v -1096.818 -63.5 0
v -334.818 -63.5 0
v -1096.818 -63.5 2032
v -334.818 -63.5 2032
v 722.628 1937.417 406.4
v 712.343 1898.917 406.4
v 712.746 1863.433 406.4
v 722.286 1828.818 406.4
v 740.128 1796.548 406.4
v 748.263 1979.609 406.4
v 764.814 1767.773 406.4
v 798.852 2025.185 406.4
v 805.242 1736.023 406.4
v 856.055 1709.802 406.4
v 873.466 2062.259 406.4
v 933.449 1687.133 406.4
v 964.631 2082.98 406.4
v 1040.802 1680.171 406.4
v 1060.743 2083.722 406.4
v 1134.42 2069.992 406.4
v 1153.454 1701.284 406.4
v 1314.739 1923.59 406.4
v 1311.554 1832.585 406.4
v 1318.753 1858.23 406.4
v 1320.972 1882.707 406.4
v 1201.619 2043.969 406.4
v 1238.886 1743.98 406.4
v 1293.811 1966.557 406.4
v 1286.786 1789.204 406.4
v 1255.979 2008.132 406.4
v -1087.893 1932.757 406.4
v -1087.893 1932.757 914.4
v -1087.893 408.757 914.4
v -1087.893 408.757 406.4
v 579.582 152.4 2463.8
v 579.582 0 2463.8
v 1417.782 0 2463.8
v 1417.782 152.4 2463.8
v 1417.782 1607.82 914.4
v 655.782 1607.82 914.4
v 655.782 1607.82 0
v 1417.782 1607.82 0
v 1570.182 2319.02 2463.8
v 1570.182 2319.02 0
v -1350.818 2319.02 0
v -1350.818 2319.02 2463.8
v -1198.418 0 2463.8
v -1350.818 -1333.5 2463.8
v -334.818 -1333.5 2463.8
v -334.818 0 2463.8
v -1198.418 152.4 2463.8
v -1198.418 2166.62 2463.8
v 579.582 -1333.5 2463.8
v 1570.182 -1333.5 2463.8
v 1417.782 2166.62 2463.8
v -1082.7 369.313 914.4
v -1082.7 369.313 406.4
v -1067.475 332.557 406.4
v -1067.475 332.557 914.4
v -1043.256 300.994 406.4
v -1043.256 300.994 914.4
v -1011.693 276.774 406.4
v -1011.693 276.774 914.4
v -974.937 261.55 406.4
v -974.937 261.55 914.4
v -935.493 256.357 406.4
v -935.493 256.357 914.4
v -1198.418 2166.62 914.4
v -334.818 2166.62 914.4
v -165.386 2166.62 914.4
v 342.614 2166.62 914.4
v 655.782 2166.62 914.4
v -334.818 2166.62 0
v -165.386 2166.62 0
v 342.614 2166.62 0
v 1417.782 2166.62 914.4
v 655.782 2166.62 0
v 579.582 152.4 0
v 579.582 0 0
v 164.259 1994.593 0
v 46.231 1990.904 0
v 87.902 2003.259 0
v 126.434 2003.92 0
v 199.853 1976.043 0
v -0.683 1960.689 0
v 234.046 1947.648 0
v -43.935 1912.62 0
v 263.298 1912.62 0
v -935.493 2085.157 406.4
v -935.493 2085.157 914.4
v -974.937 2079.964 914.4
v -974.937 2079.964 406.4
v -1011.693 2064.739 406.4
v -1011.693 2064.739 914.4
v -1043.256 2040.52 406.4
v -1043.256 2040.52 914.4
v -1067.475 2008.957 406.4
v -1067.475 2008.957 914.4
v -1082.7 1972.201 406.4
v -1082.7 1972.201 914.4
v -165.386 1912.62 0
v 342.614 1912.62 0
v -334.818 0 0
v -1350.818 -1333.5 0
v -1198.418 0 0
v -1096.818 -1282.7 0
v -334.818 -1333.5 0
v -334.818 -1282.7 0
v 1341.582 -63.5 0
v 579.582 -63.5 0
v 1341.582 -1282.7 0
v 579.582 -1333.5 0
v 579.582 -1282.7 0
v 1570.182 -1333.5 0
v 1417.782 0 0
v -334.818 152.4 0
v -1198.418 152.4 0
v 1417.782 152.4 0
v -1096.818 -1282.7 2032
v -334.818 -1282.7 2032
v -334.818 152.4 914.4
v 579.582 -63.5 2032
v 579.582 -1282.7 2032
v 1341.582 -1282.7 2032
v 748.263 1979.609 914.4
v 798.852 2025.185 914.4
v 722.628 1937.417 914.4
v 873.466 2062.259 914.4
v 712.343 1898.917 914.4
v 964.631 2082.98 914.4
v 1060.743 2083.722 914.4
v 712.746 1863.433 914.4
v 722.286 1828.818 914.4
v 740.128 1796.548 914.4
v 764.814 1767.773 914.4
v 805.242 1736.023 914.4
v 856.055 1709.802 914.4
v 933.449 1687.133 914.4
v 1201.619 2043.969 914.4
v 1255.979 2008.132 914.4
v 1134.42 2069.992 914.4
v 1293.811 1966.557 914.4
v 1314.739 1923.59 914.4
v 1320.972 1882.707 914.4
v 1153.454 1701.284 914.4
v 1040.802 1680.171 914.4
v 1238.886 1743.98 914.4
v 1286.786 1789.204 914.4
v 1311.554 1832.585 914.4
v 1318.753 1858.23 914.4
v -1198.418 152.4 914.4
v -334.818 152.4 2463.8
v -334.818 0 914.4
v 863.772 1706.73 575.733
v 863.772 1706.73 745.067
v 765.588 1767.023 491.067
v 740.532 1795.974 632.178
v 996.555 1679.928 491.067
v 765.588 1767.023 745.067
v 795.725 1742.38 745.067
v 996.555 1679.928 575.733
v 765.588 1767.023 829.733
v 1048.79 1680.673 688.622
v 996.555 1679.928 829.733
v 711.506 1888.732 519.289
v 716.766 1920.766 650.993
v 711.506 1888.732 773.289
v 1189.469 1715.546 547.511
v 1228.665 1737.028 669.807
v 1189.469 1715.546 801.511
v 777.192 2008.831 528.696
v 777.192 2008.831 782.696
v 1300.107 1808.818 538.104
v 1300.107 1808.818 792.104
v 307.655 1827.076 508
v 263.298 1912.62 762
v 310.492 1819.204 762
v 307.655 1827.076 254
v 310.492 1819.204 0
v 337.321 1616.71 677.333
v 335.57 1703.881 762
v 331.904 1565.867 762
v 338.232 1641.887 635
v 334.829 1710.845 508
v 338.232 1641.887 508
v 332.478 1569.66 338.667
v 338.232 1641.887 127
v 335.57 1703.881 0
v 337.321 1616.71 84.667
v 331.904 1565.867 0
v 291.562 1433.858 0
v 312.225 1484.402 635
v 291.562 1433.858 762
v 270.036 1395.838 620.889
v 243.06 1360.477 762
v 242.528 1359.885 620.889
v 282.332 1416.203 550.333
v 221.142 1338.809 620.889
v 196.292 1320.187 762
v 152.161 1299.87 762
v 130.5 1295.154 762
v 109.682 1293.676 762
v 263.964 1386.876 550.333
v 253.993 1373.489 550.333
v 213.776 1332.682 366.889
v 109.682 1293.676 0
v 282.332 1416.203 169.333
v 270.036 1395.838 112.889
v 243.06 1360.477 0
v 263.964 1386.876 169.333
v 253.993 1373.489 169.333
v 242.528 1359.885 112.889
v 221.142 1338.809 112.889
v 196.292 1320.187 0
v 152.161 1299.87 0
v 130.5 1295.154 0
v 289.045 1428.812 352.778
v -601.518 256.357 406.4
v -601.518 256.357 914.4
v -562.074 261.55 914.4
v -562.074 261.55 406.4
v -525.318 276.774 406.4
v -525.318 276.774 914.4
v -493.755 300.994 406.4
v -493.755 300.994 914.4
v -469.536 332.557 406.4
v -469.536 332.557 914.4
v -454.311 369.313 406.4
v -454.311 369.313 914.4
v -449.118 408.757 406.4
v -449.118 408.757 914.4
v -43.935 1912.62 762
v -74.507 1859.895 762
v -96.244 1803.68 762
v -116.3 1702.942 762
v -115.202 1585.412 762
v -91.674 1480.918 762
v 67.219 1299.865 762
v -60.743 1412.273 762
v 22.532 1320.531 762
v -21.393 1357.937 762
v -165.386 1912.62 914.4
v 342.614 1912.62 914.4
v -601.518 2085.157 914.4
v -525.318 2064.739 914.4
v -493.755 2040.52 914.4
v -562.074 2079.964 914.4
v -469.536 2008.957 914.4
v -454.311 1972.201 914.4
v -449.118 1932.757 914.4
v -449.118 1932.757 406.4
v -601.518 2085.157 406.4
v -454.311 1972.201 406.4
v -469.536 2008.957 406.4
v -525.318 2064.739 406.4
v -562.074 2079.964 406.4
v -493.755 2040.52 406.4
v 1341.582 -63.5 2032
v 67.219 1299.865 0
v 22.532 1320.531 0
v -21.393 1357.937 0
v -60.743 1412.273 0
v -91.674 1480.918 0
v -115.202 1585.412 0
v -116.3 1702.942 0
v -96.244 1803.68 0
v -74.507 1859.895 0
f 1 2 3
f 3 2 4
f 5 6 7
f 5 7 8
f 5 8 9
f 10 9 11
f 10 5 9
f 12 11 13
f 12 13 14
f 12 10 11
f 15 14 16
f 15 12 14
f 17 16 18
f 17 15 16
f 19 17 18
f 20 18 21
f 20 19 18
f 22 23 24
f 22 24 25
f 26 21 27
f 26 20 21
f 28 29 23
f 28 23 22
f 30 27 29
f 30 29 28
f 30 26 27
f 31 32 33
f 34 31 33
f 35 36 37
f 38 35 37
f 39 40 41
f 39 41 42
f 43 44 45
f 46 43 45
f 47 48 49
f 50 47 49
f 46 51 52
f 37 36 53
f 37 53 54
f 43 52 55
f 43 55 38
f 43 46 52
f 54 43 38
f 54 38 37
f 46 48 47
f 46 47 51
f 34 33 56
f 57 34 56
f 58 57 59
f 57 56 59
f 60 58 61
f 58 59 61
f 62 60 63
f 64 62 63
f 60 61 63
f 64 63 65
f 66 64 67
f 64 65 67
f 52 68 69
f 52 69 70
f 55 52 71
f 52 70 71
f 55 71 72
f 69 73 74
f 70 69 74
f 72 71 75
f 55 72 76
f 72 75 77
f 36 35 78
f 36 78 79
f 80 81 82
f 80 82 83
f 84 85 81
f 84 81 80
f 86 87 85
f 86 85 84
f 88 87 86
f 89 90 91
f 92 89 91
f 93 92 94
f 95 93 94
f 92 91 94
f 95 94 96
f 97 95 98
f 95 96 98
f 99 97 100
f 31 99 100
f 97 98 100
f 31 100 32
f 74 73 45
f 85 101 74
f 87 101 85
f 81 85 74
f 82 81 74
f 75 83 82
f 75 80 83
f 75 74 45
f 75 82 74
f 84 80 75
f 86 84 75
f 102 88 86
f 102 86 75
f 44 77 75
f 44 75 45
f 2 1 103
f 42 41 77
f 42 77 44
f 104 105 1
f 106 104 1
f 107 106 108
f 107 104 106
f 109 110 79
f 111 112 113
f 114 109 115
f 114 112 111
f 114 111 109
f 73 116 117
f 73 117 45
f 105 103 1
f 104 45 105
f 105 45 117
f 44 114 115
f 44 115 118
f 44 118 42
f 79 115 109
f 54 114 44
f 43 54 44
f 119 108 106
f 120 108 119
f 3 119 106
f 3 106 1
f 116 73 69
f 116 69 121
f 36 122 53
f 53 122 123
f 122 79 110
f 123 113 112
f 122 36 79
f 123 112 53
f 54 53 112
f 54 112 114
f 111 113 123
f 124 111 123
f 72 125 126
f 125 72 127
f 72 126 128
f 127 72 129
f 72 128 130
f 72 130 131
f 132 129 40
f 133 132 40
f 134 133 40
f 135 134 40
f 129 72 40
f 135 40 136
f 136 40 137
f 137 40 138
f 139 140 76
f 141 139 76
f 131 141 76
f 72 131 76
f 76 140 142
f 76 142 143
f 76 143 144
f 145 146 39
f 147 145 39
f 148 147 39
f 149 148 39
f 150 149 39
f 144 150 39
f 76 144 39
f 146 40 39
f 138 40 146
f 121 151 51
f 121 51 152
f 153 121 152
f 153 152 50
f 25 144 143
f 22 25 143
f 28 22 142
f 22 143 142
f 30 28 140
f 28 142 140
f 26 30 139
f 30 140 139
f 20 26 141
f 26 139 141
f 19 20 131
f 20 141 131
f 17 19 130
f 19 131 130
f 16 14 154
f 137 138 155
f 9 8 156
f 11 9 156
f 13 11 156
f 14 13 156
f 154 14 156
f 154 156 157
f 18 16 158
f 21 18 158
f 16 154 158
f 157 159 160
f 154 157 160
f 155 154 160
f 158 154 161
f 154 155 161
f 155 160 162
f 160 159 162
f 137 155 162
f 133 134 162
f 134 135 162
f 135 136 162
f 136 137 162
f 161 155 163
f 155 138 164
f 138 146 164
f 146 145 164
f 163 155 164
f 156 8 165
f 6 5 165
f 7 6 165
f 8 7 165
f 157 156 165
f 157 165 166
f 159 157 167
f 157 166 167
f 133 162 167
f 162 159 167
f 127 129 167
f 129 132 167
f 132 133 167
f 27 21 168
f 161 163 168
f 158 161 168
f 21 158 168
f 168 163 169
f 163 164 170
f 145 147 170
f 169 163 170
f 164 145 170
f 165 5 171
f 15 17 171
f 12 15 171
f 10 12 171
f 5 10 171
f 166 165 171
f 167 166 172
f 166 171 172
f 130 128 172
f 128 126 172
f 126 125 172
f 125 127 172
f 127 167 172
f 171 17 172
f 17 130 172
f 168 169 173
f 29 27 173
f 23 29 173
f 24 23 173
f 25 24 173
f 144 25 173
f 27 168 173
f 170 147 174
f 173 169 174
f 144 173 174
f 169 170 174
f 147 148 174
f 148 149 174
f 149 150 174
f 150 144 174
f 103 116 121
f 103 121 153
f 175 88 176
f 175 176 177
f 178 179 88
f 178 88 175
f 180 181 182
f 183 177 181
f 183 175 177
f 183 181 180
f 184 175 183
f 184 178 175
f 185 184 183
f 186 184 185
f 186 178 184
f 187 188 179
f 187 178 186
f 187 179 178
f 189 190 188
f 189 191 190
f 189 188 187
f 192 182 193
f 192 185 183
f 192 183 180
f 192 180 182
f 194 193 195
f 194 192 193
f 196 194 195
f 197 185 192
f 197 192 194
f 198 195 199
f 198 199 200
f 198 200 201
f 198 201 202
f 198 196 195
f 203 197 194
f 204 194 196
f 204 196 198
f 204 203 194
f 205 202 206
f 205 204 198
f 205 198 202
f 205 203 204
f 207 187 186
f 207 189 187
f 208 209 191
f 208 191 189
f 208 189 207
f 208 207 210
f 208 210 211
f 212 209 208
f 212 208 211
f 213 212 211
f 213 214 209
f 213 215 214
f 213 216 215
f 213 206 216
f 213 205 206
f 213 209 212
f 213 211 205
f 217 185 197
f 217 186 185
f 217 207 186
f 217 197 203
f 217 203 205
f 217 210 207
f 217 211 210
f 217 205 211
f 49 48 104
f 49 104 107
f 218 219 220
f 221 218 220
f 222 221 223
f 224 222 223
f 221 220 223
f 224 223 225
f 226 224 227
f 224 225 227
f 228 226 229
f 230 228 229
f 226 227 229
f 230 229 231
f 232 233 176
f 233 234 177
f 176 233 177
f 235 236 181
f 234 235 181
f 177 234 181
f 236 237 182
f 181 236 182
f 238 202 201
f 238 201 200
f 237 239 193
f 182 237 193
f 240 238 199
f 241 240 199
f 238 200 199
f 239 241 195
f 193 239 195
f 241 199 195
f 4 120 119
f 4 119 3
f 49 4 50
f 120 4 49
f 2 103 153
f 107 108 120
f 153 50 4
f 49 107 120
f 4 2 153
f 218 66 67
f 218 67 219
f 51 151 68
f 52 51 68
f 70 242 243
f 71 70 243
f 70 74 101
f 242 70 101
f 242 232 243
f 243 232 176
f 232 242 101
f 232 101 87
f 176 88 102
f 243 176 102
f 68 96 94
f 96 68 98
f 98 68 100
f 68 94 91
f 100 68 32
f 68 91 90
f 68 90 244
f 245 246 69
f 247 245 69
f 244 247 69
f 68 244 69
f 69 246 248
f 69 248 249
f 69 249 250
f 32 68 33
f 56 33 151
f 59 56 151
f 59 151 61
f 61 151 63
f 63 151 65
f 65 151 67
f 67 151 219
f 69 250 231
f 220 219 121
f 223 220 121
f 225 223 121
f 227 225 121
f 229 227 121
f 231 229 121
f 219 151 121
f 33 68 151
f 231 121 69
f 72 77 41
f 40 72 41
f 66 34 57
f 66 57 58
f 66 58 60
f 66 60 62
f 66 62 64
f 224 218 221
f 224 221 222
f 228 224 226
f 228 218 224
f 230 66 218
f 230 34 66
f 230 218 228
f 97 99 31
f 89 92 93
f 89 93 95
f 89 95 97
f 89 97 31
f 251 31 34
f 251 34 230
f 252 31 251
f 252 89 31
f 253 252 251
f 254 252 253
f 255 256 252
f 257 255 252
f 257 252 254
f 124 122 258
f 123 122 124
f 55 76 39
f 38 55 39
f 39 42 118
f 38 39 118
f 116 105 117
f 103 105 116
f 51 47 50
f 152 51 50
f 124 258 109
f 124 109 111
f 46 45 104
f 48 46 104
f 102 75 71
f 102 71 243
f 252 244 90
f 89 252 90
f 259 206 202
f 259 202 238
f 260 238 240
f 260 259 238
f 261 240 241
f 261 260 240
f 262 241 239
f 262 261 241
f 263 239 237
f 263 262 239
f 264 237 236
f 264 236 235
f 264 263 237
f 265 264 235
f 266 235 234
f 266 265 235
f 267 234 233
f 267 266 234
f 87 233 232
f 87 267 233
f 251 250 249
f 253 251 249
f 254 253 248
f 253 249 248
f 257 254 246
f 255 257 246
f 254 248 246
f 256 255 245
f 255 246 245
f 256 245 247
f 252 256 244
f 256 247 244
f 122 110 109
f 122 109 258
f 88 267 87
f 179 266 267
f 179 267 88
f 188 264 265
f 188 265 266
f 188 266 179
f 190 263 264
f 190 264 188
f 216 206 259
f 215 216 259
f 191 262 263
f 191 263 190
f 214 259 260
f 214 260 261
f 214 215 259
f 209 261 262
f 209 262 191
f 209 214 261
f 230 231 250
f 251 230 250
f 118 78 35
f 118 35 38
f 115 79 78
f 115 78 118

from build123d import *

# Parameters (mm, degrees)
F1_DEPTH  = 2463.8
F2_W      = 1219.2
F2_H      = 2032
F3_DEPTH  = 762
F4_W      = 1219.2
F4_H      = 2032
F5_DEPTH  = 762
F6_W      = 762
F6_H      = 558.8
F6_W_2    = 863.6
F6_H_2    = 2166.62
F6_W_3    = 508
F6_H_3    = 254
F7_DEPTH  = 914.4
F9_DEPTH  = 762
F11_DEPTH = 508
F12_W     = 838.2
F12_H     = 152.4
F12_W_2   = 863.6
F13_DEPTH = 2463.8


with BuildPart() as f1:
    # F0 (on Top) → F1 (new body)
    with BuildSketch(Plane.XY):
        Polygon((-334.8183358609, 0), (-1198.4183358609, 0), (-1198.4183358609, 2166.62), (1417.7816641391, 2166.62), (1417.7816641391, 0), (579.5816641391, 0), (579.5816641391, -1333.5), (1570.1816641391, -1333.5), (1570.1816641391, 0), (1570.1816641391, 2319.02), (-1350.8183358609, 2319.02), (-1350.8183358609, 0), (-1350.8183358609, -1333.5), (-334.8183358609, -1333.5), align=None)
    extrude(amount=F1_DEPTH)

    # F2 (on face) → F3 (cut)
    with BuildSketch(Plane.YZ.offset(-334.8183358609)):
        with Locations((-673.1, 1016)):
            Rectangle(F2_W, F2_H)
    extrude(amount=-F3_DEPTH, mode=Mode.SUBTRACT)

    # F4 (on face) → F5 (cut)
    with BuildSketch(Plane(origin=(579.5816641391, 0, 0), x_dir=(0, -1, 0), z_dir=(-1, 0, 0))):
        with Locations((673.1, 1016)):
            Rectangle(F4_W, F4_H)
    extrude(amount=-F5_DEPTH, mode=Mode.SUBTRACT)

    # F6 (on face) → F7 (join)
    with BuildSketch(Plane(origin=(0, 0, 0), x_dir=(1, 0, 0), z_dir=(0, 0, -1))):
        with Locations((1036.7816641391, -1887.22)):
            Rectangle(F6_W, F6_H)
        with Locations((-766.6183358609, -1083.31)):
            Rectangle(F6_W_2, F6_H_2)
        with Locations((88.6141725779, -2039.62)):
            Rectangle(F6_W_3, F6_H_3)
    extrude(amount=-F7_DEPTH)

    # F8 (on face) → F9 (join)
    with BuildSketch(Plane(origin=(0, 0, 0), x_dir=(1, 0, 0), z_dir=(0, 0, -1))):
        with BuildLine():
            add(Edge.make_bspline(
                [(109.6816062927, -1293.6762565613), (-286.2652083175, -1293.6762565613), (-88.2918010124, -1827.0762565613), (109.6816062927, -2360.4762565613), (307.6550135978, -1827.0762565613), (505.628420903, -1293.6762565613), (109.6816062927, -1293.6762565613)],
                knots=[0, 0, 0, 2.0943951024, 2.0943951024, 4.1887902048, 4.1887902048, 6.2831853072, 6.2831853072, 6.2831853072], degree=2, weights=[1, 0.5, 1, 0.5, 1, 0.5, 1]))
        make_face()
    extrude(amount=-F9_DEPTH)

    # F10 (on face) → F11 (cut)
    with BuildSketch(Plane.XY.offset(914.4)):
        with BuildLine():
            Line((-601.5183358609, 2085.1567547083), (-935.4930091858, 2085.1567547083))
            ThreePointArc((-935.4930091858, 2085.1567547083), (-1043.2560826386, 2040.5198281611), (-1087.8930091858, 1932.7567547083))
            Line((-1087.8930091858, 1932.7567547083), (-1087.8930091858, 408.7567547083))
            ThreePointArc((-1087.8930091858, 408.7567547083), (-1043.2560826386, 300.9936812555), (-935.4930091858, 256.3567547083))
            Line((-935.4930091858, 256.3567547083), (-601.5183358609, 256.3567547083))
            ThreePointArc((-601.5183358609, 256.3567547083), (-493.755262408, 300.9936812555), (-449.1183358609, 408.7567547083))
            Line((-449.1183358609, 408.7567547083), (-449.1183358609, 1932.7567547083))
            ThreePointArc((-449.1183358609, 1932.7567547083), (-493.755262408, 2040.5198281611), (-601.5183358609, 2085.1567547083))
        make_face()
        with BuildLine():
            add(Edge.make_bspline(
                [(1320.9720514297, 1882.7065229416), (1320.9720514297, 2234.6592470396), (863.7720514297, 2058.6828849906), (406.5720514297, 1882.7065229416), (863.7720514297, 1706.7301608926), (1320.9720514297, 1530.7537988436), (1320.9720514297, 1882.7065229416)],
                knots=[0, 0, 0, 2.0943951024, 2.0943951024, 4.1887902048, 4.1887902048, 6.2831853072, 6.2831853072, 6.2831853072], degree=2, weights=[1, 0.5, 1, 0.5, 1, 0.5, 1]))
        make_face()
    extrude(amount=-F11_DEPTH, mode=Mode.SUBTRACT)

    # F12 (on face) → F13 (join, through all)
    with BuildSketch(Plane(origin=(0, 0, 0), x_dir=(1, 0, 0), z_dir=(0, 0, -1))):
        with Locations((998.6816641391, -76.2)):
            Rectangle(F12_W, F12_H)
        with Locations((-766.6183358609, -76.2)):
            Rectangle(F12_W_2, F12_H)
    extrude(amount=-F13_DEPTH)


solid = f1.part
